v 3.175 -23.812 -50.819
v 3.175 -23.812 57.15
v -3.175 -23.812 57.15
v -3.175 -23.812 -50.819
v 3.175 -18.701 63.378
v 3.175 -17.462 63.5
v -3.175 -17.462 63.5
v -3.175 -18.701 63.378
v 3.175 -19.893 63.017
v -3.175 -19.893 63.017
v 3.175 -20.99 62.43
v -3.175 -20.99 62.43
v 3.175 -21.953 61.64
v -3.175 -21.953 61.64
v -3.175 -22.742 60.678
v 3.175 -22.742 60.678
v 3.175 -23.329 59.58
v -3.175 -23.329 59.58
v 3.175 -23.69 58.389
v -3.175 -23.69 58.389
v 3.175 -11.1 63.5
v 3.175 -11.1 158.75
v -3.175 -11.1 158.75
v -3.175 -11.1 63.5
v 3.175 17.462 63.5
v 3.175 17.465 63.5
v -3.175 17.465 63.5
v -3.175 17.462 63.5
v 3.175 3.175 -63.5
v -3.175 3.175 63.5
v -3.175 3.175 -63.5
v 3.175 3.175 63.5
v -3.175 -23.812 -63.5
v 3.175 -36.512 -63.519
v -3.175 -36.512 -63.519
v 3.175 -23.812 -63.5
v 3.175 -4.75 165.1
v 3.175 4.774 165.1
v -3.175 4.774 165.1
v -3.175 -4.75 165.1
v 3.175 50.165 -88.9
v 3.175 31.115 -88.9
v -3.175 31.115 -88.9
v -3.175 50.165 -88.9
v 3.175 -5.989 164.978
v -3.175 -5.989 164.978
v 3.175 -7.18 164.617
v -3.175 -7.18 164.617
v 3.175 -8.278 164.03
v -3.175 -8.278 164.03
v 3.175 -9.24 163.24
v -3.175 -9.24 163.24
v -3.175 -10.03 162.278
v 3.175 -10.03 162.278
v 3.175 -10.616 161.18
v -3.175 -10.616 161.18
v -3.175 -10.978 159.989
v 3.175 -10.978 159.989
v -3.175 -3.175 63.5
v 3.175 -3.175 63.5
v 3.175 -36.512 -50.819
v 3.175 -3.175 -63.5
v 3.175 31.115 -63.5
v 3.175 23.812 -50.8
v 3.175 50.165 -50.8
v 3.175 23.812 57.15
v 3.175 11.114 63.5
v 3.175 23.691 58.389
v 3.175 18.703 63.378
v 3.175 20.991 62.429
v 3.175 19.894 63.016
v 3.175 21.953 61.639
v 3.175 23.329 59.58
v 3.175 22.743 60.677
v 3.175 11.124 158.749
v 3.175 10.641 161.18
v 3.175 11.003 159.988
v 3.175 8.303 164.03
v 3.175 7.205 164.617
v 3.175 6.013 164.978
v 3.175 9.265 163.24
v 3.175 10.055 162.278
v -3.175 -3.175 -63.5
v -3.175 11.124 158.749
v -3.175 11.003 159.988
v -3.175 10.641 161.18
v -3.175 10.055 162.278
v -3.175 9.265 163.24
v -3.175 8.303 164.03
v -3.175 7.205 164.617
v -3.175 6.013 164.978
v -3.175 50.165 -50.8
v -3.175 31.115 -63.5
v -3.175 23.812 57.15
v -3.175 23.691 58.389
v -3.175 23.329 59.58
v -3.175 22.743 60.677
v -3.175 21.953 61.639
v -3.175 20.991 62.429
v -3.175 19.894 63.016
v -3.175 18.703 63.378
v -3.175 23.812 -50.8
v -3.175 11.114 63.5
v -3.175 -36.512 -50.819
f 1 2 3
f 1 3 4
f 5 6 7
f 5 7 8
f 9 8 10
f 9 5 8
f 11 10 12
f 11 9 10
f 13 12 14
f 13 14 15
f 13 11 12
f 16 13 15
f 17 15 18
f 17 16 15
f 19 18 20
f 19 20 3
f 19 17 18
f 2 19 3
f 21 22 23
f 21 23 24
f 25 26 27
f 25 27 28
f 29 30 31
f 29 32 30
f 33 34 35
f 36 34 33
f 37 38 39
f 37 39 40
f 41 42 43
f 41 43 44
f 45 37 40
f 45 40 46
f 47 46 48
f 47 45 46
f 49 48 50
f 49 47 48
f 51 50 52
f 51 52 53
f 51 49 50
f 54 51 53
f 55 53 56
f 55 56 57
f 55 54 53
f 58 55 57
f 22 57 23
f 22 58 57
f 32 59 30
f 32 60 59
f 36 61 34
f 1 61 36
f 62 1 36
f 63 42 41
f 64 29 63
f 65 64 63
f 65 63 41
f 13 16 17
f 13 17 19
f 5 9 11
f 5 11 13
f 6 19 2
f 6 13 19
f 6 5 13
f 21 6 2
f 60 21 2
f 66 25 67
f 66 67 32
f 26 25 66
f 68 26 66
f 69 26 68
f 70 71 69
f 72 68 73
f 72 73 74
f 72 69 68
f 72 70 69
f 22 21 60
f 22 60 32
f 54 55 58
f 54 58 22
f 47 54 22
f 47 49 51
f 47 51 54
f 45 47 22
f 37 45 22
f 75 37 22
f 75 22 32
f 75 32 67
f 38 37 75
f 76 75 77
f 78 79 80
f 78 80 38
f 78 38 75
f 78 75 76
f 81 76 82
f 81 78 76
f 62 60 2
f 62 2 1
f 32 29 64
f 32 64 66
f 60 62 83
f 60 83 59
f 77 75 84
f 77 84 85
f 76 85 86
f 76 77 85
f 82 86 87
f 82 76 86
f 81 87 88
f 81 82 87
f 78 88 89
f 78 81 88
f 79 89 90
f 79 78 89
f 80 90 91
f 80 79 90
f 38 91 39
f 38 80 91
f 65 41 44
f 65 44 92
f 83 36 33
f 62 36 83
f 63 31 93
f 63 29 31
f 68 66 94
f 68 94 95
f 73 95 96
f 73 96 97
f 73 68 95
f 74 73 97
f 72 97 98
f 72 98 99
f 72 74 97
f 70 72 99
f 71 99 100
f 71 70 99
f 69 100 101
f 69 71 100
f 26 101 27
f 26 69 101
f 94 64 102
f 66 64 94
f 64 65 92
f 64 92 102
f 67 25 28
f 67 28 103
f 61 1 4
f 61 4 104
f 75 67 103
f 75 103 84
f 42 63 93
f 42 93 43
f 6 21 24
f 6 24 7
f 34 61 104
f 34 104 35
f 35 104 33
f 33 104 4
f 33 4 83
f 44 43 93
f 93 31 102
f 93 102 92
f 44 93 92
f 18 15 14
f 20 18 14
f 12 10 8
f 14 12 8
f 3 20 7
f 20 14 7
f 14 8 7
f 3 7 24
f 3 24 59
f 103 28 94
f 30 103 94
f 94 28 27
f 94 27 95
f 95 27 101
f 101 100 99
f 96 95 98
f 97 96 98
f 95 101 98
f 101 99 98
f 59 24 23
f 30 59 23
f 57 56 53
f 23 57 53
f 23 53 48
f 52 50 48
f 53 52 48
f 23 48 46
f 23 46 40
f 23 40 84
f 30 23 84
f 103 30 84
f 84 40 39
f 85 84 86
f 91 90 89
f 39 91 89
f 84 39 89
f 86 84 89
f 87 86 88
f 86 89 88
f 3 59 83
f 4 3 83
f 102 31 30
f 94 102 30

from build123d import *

# Parameters (mm, degrees)
F1_DEPTH = 3.175


# Not quite as in the source:
# - ends of sketch curves that miss each other by under 0.0002 mm in the source are joined


with BuildPart() as f1:
    # F0 (on Right) → F1 (new body, symmetric)
    with BuildSketch(Plane.YZ):
        with BuildLine():
            Line((3.175, -63.5), (23.8125, -63.5))
            Line((23.8125, -63.5), (23.8125, -50.8))
            Line((23.8125, -50.8), (23.8125, 57.15))
            ThreePointArc((23.8125, 57.15), (21.9533763667, 61.6393796296), (17.4646167058, 63.4999996472))
            Line((17.4646167058, 63.4999996472), (17.4625, 63.5))
            Line((17.4625, 63.5), (11.1139111112, 63.5))
            Line((11.1139111112, 63.5), (11.124494366, 158.7492930333))
            ThreePointArc((11.124494366, 158.7492930333), (9.2648719104, 163.2398771909), (4.7744944052, 165.0999985889))
            Line((4.7744944052, 165.0999985889), (-4.7498, 165.0999985889))
            ThreePointArc((-4.7498, 165.0999985889), (-9.2399280605, 163.2401266494), (-11.0998, 158.7499985889))
            Line((-11.0998, 158.7499985889), (-11.0998, 63.5))
            Line((-11.0998, 63.5), (-17.4498, 63.5))
            Line((-17.4498, 63.5), (-17.4625, 63.5))
            ThreePointArc((-17.4625, 63.5), (-21.9526280605, 61.6401280605), (-23.8125, 57.15))
            Line((-23.8125, 57.15), (-23.8125, -50.818807292))
            Line((-23.8125, -50.818807292), (-23.8125, -63.5))
            Line((-23.8125, -63.5), (-3.175, -63.5))
            Line((-3.175, -63.5), (-3.175, 63.5))
            Line((-3.175, 63.5), (3.175, 63.5))
            Line((3.175, 63.5), (3.175, -63.5))
        make_face()
        Polygon((23.8125, -50.8), (23.8125, -63.5), (31.115, -63.5), (31.115, -88.9), (50.165, -88.9), (50.165, -50.8), align=None)
        Polygon((-36.5125, -63.518807292), (-23.8125, -63.5), (-23.8125, -50.818807292), (-36.5125, -50.818807292), align=None)
    extrude(amount=F1_DEPTH, both=True)


solid = f1.part
